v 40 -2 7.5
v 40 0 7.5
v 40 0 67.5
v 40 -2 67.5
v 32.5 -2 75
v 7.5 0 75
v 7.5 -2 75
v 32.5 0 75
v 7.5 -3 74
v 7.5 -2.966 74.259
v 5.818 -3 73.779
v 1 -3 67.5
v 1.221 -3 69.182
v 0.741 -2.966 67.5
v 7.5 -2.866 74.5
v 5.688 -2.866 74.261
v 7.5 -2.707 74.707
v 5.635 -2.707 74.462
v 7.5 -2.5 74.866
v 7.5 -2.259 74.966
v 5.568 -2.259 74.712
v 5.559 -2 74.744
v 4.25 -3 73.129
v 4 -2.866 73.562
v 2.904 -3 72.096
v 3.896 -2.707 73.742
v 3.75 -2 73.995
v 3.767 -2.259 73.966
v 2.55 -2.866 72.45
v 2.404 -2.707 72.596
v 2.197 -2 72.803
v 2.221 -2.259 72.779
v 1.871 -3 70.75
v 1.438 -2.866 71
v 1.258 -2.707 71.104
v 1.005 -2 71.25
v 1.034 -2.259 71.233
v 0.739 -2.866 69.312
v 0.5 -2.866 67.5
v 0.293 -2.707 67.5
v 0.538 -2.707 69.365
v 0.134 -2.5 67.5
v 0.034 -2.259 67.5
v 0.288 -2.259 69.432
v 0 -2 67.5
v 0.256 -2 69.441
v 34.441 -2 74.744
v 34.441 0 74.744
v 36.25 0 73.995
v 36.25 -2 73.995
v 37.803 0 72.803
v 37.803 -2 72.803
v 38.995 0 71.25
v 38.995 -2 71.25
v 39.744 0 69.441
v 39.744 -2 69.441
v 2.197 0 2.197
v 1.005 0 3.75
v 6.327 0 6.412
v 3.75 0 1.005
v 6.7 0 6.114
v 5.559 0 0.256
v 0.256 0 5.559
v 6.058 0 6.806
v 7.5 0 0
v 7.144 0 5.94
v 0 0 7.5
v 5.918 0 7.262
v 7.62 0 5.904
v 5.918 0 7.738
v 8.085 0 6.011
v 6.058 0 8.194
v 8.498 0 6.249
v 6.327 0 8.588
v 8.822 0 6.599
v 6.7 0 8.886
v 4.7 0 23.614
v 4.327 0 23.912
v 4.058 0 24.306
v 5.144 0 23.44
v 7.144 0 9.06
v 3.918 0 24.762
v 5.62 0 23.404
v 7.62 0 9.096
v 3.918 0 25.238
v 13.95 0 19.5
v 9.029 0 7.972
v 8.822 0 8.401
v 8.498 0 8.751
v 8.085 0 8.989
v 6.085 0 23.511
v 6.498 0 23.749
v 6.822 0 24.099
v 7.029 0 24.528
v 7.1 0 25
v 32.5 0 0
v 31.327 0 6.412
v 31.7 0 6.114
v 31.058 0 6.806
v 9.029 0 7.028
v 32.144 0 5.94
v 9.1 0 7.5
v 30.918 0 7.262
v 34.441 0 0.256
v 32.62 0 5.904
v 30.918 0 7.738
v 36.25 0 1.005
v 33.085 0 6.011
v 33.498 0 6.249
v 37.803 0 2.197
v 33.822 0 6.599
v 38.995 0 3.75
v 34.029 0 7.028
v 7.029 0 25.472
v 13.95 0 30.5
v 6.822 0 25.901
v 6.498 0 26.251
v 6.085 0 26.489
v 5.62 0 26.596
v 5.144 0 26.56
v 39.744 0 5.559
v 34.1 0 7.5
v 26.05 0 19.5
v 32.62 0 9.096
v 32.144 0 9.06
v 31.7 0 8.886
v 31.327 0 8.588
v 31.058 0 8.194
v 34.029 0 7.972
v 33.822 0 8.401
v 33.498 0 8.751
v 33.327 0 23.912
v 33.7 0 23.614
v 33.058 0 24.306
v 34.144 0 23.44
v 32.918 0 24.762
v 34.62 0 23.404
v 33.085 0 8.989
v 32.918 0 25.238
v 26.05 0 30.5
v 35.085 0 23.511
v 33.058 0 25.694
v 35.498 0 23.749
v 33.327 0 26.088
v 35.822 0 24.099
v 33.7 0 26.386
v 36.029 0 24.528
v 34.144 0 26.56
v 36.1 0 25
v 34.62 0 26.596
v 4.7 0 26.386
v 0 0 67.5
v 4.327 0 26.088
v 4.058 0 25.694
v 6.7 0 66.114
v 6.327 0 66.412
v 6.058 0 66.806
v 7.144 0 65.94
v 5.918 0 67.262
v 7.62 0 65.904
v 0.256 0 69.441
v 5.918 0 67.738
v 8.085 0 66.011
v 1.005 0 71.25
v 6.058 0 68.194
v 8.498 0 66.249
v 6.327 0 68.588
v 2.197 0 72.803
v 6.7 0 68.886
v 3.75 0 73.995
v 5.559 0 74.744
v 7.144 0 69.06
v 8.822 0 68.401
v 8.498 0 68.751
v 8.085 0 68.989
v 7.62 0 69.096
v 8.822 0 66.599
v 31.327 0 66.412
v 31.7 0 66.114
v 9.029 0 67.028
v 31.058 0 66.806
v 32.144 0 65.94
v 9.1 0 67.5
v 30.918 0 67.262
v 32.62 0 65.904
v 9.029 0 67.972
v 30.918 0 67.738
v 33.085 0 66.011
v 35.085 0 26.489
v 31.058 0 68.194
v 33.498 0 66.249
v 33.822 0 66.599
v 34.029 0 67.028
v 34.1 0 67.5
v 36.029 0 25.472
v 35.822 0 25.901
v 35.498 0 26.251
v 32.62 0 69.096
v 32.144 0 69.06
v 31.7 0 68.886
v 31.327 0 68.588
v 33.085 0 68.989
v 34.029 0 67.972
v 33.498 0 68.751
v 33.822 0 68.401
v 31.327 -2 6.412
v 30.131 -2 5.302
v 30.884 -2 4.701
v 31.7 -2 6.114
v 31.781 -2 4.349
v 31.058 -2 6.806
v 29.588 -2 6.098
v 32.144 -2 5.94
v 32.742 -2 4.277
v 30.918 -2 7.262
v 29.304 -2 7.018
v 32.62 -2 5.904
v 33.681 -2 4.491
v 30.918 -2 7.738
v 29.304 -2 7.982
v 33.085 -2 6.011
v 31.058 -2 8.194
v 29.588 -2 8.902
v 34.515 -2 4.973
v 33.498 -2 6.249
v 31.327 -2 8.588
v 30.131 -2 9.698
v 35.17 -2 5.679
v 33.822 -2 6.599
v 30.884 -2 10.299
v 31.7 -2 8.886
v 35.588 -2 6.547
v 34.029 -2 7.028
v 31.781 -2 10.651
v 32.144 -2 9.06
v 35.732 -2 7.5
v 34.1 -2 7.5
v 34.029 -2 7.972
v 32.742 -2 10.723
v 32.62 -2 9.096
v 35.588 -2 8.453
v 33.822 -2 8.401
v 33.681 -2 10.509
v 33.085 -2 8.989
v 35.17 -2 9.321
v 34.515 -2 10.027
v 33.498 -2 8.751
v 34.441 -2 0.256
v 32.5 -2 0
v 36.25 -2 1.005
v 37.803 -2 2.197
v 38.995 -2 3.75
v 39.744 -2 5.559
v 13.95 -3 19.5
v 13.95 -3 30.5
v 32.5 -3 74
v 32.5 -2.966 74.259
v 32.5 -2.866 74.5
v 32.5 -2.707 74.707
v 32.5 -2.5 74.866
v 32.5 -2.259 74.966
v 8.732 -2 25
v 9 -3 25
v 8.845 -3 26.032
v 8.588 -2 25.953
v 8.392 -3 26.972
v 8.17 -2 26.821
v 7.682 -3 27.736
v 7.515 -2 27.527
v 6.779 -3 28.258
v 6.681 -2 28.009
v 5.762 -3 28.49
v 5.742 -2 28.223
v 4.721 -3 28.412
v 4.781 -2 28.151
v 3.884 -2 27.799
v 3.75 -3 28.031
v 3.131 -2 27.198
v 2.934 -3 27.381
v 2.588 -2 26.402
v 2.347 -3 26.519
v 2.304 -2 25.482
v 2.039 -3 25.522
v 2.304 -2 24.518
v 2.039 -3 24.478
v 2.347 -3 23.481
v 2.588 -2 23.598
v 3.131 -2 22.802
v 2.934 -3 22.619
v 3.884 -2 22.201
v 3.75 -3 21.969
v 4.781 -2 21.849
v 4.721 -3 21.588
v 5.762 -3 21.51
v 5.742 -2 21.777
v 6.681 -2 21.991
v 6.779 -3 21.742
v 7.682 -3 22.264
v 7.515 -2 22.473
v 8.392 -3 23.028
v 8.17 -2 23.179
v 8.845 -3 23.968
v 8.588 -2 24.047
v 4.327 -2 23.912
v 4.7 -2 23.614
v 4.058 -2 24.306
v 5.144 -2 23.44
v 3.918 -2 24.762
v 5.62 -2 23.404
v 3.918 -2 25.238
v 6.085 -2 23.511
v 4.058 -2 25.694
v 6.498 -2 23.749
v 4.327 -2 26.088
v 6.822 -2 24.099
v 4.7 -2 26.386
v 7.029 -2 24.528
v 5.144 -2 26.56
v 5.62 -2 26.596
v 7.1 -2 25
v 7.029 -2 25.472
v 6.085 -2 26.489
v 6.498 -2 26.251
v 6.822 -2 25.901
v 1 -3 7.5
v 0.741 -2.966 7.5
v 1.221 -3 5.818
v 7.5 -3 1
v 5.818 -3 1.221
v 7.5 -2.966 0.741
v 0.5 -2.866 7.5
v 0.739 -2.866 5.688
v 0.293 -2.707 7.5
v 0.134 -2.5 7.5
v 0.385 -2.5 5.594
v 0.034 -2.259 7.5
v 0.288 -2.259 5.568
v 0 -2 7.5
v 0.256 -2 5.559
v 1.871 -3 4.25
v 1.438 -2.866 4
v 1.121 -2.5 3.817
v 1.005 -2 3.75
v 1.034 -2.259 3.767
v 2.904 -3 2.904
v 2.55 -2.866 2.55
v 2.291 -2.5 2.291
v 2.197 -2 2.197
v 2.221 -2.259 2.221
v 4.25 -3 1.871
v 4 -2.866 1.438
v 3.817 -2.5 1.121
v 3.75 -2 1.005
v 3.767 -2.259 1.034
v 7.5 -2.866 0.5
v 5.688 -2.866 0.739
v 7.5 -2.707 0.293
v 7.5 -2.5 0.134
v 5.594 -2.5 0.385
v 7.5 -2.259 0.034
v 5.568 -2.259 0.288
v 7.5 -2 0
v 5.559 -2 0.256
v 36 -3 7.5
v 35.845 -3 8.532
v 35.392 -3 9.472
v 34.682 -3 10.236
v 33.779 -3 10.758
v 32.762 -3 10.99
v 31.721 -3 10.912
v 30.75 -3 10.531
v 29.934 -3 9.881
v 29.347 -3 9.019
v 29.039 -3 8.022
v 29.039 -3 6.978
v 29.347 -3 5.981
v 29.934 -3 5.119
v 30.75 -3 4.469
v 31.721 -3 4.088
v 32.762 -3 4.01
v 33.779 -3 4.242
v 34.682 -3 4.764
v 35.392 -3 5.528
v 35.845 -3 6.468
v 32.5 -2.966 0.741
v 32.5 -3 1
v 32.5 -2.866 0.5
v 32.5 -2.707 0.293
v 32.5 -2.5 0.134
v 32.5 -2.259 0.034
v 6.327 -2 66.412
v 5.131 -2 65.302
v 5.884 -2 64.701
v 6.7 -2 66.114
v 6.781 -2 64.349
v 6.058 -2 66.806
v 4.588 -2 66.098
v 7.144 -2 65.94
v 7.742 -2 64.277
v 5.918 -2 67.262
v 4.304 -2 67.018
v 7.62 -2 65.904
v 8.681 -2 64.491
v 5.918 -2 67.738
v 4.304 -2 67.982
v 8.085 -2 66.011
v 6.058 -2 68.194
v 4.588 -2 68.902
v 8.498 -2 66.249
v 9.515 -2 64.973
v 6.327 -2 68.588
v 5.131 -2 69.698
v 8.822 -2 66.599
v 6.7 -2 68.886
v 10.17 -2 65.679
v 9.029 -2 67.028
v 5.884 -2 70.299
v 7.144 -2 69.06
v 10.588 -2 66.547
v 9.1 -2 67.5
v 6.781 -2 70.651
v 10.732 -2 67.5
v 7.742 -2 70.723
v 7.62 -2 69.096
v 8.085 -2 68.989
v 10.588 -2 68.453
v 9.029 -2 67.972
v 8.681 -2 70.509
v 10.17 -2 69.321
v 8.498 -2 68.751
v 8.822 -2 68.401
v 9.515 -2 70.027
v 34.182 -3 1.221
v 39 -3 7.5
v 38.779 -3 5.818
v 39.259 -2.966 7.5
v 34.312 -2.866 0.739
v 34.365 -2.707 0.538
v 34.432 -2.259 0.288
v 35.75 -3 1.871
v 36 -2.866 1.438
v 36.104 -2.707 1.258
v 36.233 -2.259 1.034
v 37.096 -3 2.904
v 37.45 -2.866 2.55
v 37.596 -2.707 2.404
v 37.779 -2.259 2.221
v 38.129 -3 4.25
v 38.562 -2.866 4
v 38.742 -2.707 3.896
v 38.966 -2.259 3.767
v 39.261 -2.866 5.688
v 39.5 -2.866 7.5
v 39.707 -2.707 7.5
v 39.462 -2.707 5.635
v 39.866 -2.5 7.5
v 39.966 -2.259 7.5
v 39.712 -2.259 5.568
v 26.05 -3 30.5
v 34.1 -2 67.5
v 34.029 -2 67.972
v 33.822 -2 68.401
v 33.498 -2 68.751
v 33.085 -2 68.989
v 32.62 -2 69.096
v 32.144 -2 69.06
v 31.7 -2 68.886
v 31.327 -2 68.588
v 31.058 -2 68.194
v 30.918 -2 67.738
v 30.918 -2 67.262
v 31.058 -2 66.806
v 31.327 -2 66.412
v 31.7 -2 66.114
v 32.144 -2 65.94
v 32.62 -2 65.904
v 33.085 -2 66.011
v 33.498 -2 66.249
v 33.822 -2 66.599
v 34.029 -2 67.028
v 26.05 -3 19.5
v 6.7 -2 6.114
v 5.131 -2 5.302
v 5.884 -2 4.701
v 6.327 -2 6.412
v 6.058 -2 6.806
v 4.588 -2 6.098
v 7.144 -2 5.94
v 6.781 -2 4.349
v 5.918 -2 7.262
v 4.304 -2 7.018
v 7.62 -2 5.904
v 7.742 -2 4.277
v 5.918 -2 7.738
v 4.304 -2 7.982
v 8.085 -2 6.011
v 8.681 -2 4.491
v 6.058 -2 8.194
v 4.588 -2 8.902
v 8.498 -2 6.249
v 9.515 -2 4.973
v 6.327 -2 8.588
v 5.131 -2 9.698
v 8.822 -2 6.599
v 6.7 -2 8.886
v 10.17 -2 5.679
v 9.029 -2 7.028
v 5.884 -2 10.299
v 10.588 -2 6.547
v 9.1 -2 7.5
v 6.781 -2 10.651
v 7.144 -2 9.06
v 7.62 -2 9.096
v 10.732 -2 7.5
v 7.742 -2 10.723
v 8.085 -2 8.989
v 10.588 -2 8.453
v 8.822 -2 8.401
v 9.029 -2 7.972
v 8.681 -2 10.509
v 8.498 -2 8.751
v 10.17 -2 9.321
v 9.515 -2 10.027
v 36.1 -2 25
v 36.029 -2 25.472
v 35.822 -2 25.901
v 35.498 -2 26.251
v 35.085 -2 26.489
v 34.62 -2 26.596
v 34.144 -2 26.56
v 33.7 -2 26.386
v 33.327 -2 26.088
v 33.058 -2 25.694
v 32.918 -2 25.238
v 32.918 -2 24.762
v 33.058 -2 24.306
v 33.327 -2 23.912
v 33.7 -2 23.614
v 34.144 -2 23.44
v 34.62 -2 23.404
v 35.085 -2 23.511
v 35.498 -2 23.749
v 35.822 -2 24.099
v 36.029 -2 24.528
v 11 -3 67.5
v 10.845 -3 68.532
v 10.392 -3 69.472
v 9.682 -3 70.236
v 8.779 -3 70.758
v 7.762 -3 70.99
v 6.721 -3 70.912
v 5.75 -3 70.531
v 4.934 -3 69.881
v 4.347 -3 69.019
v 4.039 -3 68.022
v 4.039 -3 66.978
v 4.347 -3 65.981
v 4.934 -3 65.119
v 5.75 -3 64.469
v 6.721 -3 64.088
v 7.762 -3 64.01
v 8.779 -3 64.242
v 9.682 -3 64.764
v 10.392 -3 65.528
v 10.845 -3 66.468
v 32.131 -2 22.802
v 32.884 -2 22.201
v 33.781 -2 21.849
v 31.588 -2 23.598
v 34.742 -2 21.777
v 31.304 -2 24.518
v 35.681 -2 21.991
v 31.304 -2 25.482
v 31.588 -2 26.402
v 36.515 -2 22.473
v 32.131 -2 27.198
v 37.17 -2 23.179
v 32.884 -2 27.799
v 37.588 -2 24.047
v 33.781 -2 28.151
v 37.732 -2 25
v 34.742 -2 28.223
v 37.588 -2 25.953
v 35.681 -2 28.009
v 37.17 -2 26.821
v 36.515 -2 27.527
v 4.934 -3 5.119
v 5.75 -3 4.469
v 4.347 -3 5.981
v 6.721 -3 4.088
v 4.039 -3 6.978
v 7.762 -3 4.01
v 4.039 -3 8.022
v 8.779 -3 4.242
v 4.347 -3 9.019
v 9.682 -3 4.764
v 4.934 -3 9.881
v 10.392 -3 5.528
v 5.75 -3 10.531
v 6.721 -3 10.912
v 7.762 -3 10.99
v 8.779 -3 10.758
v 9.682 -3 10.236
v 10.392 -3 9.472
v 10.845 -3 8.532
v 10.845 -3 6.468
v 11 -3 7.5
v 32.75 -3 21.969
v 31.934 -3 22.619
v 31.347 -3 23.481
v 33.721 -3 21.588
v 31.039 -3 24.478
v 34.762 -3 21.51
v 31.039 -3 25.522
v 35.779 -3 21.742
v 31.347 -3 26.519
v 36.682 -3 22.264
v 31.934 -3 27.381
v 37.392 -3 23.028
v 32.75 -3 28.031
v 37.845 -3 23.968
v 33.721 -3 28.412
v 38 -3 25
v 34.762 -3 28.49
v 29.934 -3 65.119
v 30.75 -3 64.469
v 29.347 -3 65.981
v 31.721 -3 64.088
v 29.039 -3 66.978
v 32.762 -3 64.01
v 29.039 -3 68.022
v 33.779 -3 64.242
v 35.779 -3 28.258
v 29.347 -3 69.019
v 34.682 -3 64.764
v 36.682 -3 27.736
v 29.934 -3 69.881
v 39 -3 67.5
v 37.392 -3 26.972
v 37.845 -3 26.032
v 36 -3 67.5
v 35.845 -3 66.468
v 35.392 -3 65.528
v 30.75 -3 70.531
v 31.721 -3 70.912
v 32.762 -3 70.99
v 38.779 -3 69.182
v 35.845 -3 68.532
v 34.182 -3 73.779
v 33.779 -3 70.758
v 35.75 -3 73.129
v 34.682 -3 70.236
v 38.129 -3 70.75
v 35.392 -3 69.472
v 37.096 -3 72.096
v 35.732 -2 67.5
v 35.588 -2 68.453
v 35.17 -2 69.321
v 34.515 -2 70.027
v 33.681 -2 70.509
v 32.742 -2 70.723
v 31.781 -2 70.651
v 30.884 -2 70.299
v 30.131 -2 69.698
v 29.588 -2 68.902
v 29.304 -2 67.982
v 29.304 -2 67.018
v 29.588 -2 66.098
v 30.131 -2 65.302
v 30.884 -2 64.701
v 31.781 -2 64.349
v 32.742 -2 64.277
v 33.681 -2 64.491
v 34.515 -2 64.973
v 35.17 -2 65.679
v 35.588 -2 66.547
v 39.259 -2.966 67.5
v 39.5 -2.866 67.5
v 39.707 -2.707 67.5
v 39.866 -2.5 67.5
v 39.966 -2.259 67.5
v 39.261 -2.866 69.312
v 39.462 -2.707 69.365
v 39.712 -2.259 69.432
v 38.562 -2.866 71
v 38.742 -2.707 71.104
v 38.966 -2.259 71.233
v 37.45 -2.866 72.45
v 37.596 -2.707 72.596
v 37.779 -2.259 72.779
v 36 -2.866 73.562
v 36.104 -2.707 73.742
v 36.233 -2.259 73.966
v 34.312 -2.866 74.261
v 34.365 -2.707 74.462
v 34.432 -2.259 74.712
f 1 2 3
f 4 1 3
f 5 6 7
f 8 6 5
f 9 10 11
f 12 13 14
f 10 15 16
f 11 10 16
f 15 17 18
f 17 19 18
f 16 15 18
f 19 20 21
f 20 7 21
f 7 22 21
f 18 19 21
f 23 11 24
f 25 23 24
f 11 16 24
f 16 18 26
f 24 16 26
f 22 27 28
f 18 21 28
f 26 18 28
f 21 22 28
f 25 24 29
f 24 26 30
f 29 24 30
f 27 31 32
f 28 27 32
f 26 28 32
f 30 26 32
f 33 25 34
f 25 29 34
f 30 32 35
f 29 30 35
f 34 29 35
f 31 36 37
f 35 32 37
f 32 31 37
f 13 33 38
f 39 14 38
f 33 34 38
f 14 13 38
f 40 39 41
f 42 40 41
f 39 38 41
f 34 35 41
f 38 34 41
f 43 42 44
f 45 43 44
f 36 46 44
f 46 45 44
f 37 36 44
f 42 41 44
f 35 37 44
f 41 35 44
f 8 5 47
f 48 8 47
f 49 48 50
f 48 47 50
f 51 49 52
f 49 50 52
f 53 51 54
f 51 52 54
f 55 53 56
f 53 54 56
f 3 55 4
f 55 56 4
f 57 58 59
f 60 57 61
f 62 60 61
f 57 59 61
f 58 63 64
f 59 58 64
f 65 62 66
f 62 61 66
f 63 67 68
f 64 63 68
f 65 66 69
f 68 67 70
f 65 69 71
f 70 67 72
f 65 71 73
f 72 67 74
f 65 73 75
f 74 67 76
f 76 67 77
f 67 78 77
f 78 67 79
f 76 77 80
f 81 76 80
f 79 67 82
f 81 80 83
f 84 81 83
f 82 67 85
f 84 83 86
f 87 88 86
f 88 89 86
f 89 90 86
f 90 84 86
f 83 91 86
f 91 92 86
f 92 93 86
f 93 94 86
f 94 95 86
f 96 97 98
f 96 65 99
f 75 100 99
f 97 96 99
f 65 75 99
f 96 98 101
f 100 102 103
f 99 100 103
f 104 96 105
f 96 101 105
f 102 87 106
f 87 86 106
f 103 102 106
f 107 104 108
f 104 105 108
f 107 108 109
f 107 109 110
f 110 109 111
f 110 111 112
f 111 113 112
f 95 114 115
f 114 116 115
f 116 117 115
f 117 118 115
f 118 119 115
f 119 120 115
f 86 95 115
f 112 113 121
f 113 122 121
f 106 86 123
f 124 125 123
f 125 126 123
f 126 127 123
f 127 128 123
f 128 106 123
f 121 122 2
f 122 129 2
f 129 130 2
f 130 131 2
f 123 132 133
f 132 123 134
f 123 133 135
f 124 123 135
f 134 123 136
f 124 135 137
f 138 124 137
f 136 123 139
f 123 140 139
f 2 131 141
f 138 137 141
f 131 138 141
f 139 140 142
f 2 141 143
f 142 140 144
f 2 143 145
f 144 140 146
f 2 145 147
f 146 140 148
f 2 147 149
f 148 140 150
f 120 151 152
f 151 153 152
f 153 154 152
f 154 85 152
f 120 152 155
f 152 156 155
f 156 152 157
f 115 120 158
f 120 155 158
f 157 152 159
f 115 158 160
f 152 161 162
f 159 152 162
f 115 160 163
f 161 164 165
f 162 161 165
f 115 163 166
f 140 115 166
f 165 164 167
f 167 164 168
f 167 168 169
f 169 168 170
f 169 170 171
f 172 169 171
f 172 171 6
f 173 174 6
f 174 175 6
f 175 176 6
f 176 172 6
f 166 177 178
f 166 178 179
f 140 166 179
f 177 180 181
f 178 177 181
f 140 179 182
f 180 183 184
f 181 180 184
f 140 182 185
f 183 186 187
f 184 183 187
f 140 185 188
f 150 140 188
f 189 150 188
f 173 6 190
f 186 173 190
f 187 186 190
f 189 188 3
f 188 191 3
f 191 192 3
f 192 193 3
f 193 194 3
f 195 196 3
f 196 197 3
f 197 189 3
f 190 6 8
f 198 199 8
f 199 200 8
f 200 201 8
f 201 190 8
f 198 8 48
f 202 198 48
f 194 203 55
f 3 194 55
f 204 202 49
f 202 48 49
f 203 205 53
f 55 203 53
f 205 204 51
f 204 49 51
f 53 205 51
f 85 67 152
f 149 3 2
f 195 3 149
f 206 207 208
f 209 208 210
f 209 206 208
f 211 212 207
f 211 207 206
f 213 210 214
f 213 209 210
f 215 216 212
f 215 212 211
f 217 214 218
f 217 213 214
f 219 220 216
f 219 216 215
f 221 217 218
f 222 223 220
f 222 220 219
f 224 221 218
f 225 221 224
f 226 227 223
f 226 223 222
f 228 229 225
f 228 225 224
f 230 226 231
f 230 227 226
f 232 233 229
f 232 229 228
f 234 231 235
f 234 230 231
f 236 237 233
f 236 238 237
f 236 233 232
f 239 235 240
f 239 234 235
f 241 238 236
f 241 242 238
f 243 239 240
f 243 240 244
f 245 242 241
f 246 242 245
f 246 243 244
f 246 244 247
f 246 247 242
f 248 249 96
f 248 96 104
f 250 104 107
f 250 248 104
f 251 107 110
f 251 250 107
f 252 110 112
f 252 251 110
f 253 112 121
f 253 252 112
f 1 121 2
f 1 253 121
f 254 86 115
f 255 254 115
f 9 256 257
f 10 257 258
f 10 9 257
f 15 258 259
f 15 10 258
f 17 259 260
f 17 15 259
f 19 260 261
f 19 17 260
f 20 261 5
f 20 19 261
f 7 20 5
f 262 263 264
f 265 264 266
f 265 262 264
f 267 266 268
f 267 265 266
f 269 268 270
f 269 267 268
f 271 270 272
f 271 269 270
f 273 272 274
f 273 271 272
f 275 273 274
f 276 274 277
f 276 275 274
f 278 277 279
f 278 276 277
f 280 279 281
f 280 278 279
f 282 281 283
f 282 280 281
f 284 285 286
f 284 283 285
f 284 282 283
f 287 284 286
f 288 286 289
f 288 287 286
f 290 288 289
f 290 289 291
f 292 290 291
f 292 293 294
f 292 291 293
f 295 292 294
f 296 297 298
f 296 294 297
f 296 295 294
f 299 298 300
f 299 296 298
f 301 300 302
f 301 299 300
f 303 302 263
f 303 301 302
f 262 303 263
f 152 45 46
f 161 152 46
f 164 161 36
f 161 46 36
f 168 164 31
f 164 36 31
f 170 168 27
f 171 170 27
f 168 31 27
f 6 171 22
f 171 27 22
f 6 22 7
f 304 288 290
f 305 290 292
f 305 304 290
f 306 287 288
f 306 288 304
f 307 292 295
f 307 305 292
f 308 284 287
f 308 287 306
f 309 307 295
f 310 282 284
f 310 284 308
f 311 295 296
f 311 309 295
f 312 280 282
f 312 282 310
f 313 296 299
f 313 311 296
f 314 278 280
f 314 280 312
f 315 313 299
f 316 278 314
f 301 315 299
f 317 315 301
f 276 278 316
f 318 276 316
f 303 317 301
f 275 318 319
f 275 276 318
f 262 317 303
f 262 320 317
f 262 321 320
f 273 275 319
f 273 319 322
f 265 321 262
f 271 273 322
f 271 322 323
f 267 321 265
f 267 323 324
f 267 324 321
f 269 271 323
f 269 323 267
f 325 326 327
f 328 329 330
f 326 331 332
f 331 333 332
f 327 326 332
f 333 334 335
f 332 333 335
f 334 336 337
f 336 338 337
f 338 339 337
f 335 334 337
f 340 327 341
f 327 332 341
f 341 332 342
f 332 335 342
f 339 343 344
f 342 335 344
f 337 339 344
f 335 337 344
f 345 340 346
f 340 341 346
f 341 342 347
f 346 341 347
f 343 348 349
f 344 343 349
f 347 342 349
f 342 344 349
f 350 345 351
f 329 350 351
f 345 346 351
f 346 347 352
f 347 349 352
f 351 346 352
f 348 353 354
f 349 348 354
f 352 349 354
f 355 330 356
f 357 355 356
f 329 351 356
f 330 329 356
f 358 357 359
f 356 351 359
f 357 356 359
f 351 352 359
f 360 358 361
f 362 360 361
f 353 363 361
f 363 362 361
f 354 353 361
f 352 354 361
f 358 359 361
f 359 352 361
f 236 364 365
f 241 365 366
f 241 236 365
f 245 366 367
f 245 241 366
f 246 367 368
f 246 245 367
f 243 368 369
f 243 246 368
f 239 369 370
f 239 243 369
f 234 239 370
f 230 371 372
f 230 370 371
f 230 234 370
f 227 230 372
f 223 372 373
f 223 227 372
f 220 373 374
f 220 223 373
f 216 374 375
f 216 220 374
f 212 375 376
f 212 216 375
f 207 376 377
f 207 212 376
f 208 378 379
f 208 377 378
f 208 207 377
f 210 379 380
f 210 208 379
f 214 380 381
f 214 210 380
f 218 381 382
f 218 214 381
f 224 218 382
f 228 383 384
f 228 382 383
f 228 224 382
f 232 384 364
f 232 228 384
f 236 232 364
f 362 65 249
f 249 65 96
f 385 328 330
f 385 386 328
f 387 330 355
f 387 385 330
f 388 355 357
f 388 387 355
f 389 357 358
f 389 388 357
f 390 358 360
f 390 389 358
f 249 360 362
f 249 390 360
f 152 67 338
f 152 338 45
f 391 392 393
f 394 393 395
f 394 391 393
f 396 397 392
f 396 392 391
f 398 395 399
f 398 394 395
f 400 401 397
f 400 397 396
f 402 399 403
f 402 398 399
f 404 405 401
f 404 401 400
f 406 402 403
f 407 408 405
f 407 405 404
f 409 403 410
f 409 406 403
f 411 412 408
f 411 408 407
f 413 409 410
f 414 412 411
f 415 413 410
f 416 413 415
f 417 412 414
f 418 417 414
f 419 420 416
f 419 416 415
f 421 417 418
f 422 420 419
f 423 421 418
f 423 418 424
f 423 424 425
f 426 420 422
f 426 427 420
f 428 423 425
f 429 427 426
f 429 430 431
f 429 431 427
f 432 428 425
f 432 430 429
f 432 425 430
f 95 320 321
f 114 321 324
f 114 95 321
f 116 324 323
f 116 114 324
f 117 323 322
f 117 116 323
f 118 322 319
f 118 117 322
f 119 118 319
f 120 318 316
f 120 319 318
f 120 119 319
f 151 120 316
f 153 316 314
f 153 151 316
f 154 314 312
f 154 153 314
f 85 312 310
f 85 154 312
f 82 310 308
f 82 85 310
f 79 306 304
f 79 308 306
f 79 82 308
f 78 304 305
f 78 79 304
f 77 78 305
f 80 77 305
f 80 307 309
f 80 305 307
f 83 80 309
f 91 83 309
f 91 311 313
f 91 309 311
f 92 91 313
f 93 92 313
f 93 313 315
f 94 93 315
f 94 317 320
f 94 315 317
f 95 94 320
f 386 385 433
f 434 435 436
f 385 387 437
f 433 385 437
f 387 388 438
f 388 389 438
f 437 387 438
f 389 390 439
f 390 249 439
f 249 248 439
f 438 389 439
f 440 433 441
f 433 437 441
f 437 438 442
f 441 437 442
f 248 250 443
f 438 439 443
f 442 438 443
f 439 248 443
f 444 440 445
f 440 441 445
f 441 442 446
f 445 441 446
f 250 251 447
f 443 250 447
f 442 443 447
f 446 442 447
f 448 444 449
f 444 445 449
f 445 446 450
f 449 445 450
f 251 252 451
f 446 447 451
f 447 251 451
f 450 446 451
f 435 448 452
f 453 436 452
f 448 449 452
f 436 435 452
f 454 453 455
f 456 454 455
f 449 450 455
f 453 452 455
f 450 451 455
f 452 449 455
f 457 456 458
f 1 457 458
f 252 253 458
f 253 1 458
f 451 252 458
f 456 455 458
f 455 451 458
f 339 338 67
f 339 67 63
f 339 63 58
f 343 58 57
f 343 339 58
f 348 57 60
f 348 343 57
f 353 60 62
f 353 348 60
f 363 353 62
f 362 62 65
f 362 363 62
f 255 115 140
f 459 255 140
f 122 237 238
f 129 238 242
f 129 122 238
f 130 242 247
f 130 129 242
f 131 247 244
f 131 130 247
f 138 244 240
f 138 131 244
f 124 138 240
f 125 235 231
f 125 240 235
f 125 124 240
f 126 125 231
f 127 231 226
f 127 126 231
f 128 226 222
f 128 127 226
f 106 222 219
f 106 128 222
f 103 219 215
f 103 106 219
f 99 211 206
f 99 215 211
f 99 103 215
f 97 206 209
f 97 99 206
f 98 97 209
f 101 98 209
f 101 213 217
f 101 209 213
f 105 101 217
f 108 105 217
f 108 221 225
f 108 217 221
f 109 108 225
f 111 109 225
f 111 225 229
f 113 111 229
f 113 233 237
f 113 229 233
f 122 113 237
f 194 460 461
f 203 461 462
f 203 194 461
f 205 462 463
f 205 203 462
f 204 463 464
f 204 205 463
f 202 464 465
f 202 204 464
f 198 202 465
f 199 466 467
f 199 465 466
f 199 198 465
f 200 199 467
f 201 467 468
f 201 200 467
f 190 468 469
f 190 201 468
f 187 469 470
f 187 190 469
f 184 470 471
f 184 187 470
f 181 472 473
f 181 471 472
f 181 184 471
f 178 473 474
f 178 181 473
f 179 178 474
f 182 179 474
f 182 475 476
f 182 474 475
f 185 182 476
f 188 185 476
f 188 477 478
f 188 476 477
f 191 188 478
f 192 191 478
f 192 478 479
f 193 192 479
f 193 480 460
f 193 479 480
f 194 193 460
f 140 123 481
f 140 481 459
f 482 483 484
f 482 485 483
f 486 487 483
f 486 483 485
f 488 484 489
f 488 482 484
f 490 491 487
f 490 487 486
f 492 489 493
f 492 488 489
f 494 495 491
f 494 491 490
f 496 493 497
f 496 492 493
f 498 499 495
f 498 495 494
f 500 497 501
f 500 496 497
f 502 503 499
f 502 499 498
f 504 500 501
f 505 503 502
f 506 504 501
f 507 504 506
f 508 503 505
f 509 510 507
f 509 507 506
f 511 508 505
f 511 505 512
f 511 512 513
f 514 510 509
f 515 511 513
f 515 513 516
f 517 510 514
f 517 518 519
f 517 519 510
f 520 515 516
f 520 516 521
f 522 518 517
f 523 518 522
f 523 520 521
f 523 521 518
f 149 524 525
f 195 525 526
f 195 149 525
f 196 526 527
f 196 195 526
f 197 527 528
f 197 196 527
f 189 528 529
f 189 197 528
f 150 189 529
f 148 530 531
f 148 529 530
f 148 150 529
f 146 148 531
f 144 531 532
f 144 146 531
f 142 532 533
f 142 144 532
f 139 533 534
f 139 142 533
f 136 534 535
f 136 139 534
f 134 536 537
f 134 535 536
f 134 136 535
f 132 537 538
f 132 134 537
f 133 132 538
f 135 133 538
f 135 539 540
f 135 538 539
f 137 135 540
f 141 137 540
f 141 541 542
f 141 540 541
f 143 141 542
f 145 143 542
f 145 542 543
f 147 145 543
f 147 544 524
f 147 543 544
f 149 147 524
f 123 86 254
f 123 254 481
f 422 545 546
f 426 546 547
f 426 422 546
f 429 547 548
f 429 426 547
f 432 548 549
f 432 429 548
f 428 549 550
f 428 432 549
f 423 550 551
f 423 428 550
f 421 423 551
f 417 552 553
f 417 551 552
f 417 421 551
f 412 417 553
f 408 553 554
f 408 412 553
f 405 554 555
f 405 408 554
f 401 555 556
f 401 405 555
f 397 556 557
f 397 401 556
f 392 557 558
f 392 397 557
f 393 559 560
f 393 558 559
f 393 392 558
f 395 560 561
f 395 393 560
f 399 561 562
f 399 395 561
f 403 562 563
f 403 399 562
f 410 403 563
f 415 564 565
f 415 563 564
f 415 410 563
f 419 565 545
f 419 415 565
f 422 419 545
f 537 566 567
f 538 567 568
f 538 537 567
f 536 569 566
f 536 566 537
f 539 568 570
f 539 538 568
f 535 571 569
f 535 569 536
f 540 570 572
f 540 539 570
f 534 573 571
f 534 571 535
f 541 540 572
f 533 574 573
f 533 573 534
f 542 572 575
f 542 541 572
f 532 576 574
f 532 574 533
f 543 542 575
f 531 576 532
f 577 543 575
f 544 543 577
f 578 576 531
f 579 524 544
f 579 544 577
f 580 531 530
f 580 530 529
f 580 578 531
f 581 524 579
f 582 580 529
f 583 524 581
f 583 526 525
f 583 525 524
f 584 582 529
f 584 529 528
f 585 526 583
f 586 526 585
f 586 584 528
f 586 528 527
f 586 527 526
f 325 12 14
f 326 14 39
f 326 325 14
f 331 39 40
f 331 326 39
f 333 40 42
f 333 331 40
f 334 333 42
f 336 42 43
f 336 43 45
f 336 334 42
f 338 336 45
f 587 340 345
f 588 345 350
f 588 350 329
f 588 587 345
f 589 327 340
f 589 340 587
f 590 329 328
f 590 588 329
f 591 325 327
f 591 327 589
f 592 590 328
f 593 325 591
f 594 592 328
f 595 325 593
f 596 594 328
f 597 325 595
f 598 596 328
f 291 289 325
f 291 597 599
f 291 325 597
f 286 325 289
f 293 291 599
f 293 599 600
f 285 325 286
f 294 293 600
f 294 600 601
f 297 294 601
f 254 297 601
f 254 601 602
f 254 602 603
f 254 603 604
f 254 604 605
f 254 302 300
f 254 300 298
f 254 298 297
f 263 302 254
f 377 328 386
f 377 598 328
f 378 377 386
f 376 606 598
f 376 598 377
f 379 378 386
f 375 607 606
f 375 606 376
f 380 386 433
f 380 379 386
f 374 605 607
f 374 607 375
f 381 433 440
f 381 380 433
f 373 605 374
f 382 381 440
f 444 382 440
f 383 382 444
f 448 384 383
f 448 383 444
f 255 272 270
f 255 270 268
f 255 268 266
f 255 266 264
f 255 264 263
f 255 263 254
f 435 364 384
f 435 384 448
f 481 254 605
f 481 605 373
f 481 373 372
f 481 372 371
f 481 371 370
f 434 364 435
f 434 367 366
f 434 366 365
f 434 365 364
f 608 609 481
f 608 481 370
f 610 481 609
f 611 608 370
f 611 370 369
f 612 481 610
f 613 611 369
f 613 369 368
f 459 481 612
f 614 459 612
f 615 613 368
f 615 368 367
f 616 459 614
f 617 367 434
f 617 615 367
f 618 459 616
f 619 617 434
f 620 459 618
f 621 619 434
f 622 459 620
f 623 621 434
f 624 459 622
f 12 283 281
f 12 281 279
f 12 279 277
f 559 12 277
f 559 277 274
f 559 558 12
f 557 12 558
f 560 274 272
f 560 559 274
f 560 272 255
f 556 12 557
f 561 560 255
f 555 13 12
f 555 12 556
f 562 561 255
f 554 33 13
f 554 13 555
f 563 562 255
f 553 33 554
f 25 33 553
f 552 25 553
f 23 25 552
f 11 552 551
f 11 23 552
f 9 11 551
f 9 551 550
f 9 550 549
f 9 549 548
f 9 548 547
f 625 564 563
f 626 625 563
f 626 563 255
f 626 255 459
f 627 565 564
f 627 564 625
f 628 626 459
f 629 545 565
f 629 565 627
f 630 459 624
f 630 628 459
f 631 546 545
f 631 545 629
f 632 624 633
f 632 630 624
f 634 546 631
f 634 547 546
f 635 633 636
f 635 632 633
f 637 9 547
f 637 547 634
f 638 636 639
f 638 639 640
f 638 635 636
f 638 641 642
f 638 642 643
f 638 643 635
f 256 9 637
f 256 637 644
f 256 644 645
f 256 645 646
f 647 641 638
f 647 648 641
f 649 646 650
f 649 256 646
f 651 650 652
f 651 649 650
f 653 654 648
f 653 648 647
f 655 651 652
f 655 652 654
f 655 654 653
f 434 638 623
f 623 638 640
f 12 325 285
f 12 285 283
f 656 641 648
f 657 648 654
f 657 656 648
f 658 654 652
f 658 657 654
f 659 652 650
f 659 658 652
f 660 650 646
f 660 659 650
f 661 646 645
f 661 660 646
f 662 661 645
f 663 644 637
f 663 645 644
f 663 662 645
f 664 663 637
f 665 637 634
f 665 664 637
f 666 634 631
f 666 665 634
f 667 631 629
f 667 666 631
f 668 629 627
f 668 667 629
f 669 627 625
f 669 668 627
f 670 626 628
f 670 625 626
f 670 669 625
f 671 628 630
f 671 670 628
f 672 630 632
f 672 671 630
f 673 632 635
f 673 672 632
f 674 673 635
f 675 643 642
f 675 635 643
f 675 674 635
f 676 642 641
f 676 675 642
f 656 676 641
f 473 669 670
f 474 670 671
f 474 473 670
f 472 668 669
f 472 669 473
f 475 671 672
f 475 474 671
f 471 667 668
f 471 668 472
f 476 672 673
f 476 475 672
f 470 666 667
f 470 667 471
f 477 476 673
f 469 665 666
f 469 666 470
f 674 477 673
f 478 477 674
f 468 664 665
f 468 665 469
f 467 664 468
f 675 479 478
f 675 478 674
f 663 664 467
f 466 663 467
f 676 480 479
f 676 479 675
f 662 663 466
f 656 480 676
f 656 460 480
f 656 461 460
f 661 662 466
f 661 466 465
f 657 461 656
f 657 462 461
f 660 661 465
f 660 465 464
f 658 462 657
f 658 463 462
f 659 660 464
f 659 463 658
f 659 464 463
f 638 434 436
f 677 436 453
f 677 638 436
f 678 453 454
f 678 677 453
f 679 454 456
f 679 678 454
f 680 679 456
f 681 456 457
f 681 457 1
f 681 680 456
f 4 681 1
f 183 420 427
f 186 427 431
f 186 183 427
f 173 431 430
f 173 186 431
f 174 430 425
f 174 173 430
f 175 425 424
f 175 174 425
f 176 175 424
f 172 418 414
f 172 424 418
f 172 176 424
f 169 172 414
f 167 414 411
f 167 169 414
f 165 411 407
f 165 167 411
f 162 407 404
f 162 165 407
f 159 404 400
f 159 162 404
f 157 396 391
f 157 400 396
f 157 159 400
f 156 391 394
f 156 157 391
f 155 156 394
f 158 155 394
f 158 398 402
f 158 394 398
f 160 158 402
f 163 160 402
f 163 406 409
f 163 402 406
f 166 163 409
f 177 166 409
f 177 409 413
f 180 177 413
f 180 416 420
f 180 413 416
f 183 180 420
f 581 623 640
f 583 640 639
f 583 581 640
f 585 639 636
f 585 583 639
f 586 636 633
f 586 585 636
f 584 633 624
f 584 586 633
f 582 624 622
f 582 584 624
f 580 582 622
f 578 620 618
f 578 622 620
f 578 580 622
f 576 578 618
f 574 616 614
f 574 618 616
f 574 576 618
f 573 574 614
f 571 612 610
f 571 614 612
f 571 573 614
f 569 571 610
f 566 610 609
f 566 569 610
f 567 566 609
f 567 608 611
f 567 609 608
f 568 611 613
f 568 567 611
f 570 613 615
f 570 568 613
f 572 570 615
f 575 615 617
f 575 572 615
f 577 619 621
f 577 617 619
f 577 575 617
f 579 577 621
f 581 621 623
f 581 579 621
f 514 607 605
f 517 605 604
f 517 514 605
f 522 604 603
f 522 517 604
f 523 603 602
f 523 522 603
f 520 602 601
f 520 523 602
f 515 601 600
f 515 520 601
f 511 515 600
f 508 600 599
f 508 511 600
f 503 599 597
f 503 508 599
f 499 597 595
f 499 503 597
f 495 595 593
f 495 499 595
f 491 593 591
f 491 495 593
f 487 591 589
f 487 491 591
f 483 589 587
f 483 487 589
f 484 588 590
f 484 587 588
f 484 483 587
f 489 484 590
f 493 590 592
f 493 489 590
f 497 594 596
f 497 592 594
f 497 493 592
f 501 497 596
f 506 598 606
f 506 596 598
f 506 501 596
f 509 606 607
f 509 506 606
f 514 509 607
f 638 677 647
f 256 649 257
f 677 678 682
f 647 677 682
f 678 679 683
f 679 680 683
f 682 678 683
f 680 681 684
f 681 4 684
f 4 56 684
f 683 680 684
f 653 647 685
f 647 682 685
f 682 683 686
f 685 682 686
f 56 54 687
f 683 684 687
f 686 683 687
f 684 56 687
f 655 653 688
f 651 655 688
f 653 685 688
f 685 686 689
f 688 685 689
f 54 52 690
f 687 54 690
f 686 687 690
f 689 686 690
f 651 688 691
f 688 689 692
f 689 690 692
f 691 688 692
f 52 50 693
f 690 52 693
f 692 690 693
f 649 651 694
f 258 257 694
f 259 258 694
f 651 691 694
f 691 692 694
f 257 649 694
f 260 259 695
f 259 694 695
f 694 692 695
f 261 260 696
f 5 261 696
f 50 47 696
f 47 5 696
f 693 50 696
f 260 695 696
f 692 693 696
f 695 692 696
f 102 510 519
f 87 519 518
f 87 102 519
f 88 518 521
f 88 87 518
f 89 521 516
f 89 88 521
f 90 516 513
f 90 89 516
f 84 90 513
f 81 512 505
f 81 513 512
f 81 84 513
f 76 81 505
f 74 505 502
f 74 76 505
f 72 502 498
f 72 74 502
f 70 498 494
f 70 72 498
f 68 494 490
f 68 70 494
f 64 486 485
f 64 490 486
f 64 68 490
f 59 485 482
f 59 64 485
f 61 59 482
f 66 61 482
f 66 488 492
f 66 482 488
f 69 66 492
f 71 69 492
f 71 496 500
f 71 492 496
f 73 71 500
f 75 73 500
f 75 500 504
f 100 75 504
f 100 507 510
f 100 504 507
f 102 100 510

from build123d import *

# Parameters (mm, degrees)
F0_W     = 40
F0_H     = 75
F0_R     = 1.6
F0_W_2   = 12.1
F0_H_2   = 11
F1_DEPTH = 3
F2_R     = 7.5
F3_R     = 3.5
F4_DEPTH = 1
F4_TAPER = 15
F5_R     = 1


with BuildPart() as f1:
    # F0 (on Front) → F1 (new body)
    with BuildSketch(Plane.XZ):
        with Locations((20, 37.5)):
            Rectangle(F0_W, F0_H)
        with Locations((7.5, 7.5)):
            Circle(F0_R, mode=Mode.SUBTRACT)
        with Locations((5.5, 25)):
            Circle(F0_R, mode=Mode.SUBTRACT)
        with Locations((32.5, 7.5)):
            Circle(F0_R, mode=Mode.SUBTRACT)
        with Locations((20, 25)):
            Rectangle(F0_W_2, F0_H_2, mode=Mode.SUBTRACT)
        with Locations((34.5, 25)):
            Circle(F0_R, mode=Mode.SUBTRACT)
        with Locations((7.5, 67.5)):
            Circle(F0_R, mode=Mode.SUBTRACT)
        with Locations((32.5, 67.5)):
            Circle(F0_R, mode=Mode.SUBTRACT)
    extrude(amount=F1_DEPTH)

    # F2
    f2_edges = [f1.edges().sort_by_distance(p)[0] for p in [
        (40, -1.5, 75),
        (40, -1.5, 0),
        (0, -1.5, 0),
        (0, -1.5, 75),
    ]]
    fillet(f2_edges, radius=F2_R)

    # F3 (on face) → F4 (cut)
    with BuildSketch(Plane.XZ.offset(3)):
        with Locations((7.5, 67.5)):
            Circle(F3_R)
        with Locations((32.5, 67.5)):
            Circle(F3_R)
        with Locations((5.5, 25)):
            Circle(F3_R)
        with Locations((32.5, 7.5)):
            Circle(F3_R)
        with Locations((7.5, 7.5)):
            Circle(F3_R)
        with Locations((34.5, 25)):
            Circle(F3_R)
    extrude(amount=-F4_DEPTH, taper=F4_TAPER, mode=Mode.SUBTRACT)

    # F5
    f5_edges = [f1.edges().sort_by_distance(p)[0] for p in [
        (20, -3, 0),
    ]]
    fillet(f5_edges, radius=F5_R)


solid = f1.part
